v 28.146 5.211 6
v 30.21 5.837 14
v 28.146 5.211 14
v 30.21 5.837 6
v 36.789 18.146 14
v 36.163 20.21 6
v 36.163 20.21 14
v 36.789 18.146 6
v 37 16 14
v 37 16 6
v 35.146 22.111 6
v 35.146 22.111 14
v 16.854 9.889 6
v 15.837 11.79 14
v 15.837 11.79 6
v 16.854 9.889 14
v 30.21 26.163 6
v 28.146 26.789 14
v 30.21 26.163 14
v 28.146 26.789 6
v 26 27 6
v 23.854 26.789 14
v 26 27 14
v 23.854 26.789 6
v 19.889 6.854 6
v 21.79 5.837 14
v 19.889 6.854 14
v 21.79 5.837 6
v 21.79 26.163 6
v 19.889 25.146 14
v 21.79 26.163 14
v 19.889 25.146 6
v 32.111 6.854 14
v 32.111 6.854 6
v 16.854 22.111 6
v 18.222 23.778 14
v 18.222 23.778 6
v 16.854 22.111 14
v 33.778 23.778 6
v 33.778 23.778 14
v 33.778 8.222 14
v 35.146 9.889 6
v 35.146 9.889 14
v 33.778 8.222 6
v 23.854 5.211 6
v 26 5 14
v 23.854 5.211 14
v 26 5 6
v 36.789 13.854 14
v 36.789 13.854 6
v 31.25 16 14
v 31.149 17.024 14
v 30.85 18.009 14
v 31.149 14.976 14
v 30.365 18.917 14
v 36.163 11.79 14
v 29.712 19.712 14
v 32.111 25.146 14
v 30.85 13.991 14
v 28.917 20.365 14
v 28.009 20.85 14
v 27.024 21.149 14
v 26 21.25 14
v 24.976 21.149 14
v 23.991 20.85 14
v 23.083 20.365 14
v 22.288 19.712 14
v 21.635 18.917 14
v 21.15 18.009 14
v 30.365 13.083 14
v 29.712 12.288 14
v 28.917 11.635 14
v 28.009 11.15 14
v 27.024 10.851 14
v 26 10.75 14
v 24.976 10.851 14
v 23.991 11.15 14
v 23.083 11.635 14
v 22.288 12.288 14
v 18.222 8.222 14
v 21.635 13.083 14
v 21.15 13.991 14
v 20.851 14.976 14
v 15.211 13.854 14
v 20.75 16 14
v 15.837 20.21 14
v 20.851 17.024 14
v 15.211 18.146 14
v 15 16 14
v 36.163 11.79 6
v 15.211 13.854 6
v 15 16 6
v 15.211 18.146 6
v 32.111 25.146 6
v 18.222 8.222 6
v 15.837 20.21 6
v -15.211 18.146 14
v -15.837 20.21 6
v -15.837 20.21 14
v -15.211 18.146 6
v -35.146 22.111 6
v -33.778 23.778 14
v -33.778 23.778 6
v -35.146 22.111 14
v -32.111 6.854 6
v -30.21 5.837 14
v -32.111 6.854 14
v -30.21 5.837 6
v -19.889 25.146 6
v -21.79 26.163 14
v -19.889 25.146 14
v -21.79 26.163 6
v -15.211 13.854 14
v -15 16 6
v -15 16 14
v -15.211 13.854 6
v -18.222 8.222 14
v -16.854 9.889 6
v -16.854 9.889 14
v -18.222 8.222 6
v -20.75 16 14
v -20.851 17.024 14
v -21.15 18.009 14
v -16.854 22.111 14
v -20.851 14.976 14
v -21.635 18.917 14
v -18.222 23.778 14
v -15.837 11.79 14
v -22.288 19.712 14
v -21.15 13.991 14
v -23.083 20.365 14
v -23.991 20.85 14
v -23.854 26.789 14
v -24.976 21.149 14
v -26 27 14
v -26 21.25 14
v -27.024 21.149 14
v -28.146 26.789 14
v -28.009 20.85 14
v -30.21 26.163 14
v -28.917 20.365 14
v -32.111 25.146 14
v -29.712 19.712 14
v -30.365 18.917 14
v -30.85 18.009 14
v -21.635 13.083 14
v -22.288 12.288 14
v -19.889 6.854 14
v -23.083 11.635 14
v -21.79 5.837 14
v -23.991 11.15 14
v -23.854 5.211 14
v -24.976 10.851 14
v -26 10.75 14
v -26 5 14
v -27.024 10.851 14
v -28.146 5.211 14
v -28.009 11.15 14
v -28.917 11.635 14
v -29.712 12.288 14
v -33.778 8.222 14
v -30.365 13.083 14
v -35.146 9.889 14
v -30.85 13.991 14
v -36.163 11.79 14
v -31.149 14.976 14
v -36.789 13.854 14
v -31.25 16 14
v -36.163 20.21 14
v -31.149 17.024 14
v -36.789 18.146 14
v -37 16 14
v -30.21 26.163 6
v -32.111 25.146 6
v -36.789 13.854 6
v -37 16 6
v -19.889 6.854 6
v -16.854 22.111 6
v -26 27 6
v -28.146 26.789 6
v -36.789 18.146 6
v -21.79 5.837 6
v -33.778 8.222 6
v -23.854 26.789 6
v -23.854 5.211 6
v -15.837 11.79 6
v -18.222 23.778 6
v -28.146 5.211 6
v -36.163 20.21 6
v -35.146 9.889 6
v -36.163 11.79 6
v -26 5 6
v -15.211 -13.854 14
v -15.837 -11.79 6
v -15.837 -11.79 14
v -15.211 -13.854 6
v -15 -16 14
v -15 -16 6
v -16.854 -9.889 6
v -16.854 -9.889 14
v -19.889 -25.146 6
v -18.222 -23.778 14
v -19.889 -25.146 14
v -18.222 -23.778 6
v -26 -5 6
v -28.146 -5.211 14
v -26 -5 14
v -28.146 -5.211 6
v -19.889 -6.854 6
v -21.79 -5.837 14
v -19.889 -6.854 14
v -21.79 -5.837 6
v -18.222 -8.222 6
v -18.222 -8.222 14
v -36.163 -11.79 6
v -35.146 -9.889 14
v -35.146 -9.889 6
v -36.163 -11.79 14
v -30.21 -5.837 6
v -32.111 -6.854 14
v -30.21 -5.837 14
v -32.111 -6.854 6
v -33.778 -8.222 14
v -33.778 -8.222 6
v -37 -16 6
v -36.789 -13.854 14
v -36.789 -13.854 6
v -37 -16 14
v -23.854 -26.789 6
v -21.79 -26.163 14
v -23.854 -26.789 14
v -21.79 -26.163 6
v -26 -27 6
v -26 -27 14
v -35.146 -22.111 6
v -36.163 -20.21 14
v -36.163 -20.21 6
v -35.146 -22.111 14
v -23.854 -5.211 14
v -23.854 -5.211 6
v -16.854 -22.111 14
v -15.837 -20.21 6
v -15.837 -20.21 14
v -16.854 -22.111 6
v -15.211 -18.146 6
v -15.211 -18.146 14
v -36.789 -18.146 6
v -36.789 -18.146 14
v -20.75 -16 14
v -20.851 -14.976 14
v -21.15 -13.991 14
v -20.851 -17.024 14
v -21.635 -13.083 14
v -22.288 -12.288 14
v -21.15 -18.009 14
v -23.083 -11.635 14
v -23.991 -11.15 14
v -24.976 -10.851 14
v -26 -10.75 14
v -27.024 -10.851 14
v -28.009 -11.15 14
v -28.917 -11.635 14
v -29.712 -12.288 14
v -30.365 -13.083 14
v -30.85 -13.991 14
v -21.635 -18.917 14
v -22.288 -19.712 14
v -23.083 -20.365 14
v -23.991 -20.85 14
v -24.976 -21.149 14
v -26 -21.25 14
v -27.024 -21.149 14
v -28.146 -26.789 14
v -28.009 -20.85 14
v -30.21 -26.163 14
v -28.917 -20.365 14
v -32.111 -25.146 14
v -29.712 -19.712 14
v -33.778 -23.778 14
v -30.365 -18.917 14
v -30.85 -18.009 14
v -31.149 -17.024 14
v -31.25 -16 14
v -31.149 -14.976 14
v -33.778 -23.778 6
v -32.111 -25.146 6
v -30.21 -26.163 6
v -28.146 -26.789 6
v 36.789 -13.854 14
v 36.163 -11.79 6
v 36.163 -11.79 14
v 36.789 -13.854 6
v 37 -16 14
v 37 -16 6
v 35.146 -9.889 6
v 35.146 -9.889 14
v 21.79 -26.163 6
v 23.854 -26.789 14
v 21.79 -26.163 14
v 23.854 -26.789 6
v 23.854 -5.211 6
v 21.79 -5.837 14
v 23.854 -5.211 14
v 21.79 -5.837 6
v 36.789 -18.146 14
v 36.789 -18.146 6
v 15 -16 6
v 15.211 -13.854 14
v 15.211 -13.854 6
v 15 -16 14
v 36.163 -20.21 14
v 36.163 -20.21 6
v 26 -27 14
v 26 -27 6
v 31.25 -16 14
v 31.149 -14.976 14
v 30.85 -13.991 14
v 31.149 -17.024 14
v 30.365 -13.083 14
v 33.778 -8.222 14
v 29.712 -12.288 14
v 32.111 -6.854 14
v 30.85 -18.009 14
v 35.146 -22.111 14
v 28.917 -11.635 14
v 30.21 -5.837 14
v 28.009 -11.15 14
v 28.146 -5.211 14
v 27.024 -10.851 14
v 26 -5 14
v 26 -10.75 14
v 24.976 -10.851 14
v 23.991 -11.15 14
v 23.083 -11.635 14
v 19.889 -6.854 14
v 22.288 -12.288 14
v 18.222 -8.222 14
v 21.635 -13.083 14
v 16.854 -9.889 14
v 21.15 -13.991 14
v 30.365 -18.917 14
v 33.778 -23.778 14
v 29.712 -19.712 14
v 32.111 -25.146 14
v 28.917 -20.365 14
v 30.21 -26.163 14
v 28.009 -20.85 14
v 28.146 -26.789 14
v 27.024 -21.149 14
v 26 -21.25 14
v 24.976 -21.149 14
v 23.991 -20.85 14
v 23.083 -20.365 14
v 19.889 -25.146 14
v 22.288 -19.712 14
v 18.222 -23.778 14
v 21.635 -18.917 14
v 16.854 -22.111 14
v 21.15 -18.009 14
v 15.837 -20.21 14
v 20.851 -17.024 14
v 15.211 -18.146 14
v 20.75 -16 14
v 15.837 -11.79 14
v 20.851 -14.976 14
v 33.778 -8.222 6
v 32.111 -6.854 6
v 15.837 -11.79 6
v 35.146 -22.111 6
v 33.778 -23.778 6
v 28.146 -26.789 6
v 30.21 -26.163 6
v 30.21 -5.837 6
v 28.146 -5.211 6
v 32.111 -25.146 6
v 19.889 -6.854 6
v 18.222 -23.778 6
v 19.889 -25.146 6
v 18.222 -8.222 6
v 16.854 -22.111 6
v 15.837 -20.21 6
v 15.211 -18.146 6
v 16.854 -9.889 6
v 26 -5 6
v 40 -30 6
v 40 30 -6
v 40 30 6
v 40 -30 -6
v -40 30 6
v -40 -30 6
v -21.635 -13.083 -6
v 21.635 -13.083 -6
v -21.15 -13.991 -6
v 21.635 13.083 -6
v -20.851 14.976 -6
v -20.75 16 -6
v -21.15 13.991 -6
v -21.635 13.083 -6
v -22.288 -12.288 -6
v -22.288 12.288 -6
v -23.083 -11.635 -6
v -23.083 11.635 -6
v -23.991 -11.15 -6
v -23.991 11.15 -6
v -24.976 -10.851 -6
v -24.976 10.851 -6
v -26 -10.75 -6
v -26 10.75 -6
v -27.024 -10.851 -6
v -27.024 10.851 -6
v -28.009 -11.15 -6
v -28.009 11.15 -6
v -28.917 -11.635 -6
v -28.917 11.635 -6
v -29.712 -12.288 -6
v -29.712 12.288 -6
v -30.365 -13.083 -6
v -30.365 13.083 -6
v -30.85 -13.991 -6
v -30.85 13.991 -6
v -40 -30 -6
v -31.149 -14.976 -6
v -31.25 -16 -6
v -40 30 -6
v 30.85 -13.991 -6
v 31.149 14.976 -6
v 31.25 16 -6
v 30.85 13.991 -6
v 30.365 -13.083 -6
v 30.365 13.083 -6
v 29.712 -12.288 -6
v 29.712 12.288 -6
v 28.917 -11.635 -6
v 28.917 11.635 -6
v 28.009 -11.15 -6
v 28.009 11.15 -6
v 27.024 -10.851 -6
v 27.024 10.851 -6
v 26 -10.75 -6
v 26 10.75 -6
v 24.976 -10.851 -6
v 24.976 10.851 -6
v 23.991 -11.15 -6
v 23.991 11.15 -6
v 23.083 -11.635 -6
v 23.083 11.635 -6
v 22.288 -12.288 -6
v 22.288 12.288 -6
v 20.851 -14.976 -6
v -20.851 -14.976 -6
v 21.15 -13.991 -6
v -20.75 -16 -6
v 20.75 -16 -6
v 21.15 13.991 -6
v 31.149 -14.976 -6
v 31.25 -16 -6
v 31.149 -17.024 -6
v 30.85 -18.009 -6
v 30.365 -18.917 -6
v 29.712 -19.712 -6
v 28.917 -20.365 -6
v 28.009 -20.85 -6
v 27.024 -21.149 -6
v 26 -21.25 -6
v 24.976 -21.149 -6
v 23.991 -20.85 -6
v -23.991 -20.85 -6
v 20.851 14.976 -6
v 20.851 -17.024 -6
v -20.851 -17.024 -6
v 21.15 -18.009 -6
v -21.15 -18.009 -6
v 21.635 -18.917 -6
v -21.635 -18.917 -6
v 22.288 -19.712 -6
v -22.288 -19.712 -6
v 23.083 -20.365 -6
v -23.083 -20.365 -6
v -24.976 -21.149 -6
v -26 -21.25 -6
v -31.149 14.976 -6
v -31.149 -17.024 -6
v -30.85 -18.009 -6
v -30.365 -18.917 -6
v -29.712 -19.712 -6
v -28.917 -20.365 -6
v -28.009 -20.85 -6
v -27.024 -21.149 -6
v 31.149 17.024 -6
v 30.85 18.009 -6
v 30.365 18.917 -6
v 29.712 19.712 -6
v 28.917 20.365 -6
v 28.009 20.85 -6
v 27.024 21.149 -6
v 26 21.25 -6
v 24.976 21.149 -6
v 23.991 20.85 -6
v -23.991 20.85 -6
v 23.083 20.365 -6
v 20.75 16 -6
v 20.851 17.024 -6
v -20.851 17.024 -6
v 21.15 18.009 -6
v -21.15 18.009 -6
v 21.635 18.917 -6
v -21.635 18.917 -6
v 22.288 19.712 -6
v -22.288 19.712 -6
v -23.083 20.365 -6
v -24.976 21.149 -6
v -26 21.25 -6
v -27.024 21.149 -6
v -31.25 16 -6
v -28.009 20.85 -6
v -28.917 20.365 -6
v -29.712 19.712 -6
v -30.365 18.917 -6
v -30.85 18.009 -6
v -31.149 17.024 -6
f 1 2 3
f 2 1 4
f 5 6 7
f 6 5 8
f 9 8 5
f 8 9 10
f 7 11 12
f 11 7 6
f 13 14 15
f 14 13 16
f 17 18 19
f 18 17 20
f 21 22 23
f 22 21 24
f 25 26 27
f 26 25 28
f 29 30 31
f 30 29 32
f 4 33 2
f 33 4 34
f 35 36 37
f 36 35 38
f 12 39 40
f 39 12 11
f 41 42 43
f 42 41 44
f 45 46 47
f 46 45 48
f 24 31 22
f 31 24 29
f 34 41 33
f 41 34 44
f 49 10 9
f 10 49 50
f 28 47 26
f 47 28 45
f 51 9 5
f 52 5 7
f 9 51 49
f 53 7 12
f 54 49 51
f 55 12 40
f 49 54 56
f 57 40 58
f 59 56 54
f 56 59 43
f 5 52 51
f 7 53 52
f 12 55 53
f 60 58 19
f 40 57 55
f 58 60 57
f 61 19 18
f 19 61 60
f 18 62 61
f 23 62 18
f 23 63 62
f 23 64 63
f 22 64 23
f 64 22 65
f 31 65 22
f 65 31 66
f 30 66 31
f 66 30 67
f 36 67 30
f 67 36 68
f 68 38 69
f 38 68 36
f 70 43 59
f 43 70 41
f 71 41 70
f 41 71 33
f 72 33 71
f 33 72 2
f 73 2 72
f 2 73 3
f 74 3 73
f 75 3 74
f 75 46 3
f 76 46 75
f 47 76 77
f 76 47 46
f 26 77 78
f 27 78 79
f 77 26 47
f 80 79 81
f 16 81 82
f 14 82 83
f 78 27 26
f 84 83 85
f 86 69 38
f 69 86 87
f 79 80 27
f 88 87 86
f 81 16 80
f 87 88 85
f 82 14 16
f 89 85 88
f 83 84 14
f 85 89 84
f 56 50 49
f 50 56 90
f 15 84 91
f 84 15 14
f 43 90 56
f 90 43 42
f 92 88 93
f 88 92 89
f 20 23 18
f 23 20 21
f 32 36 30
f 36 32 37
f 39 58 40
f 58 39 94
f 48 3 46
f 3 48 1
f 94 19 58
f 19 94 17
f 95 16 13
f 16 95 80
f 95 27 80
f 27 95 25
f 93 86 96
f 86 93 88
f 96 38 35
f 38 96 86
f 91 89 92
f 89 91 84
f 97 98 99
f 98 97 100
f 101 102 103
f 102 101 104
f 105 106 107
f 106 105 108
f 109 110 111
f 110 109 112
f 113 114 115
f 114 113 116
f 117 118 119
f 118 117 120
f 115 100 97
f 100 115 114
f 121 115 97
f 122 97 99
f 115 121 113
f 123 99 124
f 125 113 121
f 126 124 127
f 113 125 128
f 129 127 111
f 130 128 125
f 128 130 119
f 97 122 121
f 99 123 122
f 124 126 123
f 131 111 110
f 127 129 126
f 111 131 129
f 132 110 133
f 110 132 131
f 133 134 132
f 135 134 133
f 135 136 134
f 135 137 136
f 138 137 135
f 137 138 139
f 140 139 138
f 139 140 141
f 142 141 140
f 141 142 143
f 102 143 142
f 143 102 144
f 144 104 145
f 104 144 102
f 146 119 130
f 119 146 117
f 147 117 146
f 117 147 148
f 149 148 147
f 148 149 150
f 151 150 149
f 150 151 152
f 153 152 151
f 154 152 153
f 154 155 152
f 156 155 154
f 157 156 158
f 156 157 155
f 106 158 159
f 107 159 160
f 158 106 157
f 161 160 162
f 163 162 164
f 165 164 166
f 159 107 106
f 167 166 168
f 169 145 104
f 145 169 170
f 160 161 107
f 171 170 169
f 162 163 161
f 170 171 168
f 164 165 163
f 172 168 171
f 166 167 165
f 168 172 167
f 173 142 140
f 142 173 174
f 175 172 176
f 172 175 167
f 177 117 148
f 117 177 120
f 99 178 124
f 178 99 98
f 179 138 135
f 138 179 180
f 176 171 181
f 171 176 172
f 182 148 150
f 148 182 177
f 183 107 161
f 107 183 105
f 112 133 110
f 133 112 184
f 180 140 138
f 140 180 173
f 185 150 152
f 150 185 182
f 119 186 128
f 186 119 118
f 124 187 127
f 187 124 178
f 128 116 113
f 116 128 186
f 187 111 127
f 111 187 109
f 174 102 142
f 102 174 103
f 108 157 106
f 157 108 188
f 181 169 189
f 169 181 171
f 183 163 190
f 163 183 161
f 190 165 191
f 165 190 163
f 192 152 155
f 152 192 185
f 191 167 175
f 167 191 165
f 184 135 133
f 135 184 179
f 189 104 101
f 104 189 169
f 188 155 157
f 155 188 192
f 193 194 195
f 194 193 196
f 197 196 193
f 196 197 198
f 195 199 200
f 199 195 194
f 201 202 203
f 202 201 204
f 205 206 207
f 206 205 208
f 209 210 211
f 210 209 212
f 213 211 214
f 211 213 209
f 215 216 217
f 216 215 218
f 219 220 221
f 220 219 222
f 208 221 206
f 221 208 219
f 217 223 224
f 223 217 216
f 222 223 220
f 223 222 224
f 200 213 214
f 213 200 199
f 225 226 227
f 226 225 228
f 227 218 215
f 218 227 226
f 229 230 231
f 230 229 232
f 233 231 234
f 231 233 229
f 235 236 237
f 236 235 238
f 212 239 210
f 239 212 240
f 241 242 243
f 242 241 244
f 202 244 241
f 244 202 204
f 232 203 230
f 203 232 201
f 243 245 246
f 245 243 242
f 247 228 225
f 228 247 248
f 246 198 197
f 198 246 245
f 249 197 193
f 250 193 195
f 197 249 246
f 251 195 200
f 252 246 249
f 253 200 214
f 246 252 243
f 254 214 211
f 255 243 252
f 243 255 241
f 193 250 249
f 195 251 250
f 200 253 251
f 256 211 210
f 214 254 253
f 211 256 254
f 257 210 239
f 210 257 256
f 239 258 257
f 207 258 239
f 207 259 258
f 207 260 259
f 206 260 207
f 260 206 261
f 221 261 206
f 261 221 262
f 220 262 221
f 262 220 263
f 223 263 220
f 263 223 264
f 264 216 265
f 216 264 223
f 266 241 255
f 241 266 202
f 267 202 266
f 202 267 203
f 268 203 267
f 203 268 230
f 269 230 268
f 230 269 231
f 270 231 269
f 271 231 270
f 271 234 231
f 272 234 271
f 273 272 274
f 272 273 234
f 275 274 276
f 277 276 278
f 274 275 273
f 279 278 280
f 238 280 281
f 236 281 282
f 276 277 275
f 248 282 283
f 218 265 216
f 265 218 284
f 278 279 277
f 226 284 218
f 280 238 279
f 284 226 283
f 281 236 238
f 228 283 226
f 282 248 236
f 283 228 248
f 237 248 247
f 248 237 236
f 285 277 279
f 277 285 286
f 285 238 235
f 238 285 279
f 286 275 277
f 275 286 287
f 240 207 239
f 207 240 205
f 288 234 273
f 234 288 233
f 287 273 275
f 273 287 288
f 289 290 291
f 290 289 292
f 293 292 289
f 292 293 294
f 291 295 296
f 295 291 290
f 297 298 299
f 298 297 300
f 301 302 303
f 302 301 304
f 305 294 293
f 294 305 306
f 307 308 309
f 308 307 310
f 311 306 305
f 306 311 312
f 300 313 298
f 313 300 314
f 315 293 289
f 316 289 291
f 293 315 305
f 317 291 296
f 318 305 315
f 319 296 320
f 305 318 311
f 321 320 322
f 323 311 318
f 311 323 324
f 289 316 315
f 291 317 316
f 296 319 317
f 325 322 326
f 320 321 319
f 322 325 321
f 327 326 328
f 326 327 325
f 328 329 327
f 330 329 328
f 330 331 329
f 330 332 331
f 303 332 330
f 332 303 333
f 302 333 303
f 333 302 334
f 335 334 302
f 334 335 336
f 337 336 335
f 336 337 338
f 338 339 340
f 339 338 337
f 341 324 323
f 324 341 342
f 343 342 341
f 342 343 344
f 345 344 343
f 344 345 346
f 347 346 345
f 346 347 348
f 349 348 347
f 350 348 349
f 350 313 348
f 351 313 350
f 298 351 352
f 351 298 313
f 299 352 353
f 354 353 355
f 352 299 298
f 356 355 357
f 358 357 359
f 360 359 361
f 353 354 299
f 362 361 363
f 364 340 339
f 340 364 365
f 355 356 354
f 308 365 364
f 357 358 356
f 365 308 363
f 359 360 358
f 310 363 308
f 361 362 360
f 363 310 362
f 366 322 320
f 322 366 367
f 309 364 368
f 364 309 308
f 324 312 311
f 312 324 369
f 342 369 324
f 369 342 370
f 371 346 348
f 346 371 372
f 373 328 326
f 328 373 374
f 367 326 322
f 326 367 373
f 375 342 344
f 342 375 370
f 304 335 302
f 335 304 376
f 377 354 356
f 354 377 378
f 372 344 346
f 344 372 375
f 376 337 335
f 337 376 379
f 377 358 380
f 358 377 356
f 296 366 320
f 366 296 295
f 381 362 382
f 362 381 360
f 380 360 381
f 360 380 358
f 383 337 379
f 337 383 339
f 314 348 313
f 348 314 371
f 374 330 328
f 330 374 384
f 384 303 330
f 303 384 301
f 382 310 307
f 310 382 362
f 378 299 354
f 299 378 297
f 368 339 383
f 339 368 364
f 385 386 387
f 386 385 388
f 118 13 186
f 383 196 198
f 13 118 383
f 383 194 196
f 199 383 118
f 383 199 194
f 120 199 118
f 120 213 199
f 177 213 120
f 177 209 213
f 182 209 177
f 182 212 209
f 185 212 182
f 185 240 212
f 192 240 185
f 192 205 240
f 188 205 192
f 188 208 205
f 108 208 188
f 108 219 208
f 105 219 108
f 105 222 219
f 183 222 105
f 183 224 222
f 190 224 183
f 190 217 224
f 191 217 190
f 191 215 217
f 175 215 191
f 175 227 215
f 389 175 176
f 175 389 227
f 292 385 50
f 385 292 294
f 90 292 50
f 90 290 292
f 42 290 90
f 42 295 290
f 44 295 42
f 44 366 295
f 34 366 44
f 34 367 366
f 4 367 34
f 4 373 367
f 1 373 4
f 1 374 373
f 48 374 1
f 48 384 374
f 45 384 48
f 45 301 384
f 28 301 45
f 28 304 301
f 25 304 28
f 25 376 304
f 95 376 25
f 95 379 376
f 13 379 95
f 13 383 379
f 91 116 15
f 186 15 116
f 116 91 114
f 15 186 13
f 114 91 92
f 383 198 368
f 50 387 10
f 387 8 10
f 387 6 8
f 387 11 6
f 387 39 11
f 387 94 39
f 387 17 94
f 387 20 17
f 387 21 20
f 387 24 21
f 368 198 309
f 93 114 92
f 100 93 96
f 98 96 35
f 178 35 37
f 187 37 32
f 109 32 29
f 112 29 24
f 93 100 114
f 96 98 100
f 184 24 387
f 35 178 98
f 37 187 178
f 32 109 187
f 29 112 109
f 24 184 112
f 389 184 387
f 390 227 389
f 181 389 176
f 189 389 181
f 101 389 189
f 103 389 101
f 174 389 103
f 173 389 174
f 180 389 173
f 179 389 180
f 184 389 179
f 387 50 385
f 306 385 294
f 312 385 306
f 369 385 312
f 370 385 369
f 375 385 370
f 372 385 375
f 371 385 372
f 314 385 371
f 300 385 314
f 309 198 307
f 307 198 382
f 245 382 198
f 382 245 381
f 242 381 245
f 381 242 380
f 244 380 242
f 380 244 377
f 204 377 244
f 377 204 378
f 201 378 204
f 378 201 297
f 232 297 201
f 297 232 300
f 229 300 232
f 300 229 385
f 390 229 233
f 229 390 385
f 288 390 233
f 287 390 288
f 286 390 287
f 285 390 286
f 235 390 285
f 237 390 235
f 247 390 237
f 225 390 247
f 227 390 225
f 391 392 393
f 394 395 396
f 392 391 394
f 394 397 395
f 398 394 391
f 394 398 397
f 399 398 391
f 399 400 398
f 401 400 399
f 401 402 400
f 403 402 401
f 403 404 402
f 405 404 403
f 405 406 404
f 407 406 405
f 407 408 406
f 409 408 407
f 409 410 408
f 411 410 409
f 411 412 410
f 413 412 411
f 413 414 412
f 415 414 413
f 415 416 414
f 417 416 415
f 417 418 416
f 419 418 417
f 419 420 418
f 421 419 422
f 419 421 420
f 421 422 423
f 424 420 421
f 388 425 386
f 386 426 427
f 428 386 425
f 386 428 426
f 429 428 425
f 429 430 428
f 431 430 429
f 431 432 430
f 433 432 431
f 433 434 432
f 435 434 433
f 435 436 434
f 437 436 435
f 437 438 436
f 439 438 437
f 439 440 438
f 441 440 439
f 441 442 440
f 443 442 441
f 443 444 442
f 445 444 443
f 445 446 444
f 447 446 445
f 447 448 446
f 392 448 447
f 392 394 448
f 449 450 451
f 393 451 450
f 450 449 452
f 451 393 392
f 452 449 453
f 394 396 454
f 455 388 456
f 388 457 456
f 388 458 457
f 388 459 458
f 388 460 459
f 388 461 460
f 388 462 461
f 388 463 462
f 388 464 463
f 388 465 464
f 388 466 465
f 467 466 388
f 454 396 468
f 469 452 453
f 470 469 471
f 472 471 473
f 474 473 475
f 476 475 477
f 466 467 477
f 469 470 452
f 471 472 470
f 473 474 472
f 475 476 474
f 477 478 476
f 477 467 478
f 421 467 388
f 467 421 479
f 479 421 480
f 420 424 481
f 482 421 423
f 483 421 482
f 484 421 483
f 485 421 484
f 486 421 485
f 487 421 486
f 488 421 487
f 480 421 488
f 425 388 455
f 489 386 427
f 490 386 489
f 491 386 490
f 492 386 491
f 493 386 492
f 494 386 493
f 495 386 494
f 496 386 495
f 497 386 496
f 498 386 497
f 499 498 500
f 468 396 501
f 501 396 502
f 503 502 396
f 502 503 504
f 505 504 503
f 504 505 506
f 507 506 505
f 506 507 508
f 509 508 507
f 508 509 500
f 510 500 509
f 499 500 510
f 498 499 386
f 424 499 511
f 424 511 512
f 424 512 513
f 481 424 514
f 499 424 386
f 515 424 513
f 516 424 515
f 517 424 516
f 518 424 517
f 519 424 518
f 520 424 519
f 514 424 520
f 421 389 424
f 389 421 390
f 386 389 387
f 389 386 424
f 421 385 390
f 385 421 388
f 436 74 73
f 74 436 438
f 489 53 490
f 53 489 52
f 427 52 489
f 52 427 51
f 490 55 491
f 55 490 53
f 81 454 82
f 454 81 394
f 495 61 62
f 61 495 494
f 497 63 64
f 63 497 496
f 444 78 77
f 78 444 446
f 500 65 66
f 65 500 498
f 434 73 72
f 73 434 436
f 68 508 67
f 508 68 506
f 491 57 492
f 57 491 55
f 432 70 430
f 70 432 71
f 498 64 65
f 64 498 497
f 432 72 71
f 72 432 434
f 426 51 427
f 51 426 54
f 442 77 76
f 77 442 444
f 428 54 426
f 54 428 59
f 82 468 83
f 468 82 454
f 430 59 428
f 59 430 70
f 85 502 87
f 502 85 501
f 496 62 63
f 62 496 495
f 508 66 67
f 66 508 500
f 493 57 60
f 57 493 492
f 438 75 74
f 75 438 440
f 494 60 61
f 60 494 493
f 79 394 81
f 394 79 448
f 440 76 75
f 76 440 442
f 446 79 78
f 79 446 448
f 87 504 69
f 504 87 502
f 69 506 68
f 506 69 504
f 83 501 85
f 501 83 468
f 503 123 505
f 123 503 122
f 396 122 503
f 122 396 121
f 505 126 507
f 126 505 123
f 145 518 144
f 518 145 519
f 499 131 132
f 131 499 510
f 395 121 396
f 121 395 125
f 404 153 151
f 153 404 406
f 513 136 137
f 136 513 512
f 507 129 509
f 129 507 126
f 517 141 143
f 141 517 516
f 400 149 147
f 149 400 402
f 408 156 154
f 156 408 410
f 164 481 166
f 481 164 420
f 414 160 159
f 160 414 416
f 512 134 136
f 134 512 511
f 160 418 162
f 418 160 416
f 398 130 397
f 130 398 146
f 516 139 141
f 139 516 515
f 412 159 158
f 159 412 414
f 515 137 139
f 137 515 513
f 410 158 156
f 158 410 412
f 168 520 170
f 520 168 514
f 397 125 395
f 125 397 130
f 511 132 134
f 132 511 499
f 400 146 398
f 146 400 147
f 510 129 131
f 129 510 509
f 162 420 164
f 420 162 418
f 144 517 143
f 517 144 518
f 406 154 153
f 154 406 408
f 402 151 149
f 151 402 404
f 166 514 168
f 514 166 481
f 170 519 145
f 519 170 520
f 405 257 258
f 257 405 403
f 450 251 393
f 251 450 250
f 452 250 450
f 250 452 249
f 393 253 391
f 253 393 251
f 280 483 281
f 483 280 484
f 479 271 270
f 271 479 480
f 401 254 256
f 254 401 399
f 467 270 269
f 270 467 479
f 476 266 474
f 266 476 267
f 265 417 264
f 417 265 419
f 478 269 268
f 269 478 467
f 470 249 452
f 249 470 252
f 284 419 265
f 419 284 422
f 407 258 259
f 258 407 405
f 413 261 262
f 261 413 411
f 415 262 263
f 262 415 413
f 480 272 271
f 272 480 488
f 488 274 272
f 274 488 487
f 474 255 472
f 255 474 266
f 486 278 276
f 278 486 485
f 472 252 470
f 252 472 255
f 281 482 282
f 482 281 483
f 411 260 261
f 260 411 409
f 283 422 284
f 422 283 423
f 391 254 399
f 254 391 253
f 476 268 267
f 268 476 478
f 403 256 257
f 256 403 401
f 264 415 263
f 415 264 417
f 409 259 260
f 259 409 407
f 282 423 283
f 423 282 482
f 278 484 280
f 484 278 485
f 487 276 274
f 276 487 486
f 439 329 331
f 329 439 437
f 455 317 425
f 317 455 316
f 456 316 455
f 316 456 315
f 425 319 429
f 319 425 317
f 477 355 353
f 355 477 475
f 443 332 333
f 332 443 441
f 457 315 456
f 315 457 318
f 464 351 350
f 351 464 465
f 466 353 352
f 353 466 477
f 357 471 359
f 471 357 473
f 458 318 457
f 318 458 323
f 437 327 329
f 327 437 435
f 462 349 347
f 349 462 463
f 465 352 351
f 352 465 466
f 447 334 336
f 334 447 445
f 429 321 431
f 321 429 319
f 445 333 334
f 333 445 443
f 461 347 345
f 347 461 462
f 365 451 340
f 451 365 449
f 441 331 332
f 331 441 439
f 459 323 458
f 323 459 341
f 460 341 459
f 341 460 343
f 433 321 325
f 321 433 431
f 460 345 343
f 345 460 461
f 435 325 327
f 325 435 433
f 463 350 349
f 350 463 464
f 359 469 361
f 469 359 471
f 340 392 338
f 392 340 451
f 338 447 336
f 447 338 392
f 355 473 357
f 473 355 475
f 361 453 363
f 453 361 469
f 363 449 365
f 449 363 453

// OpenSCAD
$fn = 32;

// ----------------------------------------------------------------------
// Anchor pads 80 x 60 x 20
// four corner bosses with anchor holes
// ----------------------------------------------------------------------

// --- parameters (mm) ---
plate = [80, 60, 12];  // base plate size (x, y, z)
pads = 4;              // boss count, one per corner
edge = 14;             // boss centre offset from the plate edge
boss_d = 22;           // boss diameter
boss_h = 8;            // boss height above the base plate
hole_d = 10.5;         // hole diameter

// --- derived feature positions (mm) ---
height = plate[2] + boss_h;      // = 20   overall height of the part
corner_x = plate[0] / 2 - edge;  // = 26   boss centre X
corner_y = plate[1] / 2 - edge;  // = 16   boss centre Y
feature_centers = [
  [corner_x, corner_y],
  [-corner_x, corner_y],
  [-corner_x, -corner_y],
  [corner_x, -corner_y]
];   // boss centres, anchor holes are drilled there

// base plate, four bosses standing on it, anchor holes all the way through
difference() {
  union() {
    cube(plate, center = true);
    for (centre = feature_centers)
      translate([centre[0], centre[1], plate[2] / 2 - 1])
        cylinder(d = boss_d, h = boss_h + 1);
  }
  for (centre = feature_centers)
    translate([centre[0], centre[1], -height])
      cylinder(d = hole_d, h = 2 * height + 2);  // through boss and plate
}
